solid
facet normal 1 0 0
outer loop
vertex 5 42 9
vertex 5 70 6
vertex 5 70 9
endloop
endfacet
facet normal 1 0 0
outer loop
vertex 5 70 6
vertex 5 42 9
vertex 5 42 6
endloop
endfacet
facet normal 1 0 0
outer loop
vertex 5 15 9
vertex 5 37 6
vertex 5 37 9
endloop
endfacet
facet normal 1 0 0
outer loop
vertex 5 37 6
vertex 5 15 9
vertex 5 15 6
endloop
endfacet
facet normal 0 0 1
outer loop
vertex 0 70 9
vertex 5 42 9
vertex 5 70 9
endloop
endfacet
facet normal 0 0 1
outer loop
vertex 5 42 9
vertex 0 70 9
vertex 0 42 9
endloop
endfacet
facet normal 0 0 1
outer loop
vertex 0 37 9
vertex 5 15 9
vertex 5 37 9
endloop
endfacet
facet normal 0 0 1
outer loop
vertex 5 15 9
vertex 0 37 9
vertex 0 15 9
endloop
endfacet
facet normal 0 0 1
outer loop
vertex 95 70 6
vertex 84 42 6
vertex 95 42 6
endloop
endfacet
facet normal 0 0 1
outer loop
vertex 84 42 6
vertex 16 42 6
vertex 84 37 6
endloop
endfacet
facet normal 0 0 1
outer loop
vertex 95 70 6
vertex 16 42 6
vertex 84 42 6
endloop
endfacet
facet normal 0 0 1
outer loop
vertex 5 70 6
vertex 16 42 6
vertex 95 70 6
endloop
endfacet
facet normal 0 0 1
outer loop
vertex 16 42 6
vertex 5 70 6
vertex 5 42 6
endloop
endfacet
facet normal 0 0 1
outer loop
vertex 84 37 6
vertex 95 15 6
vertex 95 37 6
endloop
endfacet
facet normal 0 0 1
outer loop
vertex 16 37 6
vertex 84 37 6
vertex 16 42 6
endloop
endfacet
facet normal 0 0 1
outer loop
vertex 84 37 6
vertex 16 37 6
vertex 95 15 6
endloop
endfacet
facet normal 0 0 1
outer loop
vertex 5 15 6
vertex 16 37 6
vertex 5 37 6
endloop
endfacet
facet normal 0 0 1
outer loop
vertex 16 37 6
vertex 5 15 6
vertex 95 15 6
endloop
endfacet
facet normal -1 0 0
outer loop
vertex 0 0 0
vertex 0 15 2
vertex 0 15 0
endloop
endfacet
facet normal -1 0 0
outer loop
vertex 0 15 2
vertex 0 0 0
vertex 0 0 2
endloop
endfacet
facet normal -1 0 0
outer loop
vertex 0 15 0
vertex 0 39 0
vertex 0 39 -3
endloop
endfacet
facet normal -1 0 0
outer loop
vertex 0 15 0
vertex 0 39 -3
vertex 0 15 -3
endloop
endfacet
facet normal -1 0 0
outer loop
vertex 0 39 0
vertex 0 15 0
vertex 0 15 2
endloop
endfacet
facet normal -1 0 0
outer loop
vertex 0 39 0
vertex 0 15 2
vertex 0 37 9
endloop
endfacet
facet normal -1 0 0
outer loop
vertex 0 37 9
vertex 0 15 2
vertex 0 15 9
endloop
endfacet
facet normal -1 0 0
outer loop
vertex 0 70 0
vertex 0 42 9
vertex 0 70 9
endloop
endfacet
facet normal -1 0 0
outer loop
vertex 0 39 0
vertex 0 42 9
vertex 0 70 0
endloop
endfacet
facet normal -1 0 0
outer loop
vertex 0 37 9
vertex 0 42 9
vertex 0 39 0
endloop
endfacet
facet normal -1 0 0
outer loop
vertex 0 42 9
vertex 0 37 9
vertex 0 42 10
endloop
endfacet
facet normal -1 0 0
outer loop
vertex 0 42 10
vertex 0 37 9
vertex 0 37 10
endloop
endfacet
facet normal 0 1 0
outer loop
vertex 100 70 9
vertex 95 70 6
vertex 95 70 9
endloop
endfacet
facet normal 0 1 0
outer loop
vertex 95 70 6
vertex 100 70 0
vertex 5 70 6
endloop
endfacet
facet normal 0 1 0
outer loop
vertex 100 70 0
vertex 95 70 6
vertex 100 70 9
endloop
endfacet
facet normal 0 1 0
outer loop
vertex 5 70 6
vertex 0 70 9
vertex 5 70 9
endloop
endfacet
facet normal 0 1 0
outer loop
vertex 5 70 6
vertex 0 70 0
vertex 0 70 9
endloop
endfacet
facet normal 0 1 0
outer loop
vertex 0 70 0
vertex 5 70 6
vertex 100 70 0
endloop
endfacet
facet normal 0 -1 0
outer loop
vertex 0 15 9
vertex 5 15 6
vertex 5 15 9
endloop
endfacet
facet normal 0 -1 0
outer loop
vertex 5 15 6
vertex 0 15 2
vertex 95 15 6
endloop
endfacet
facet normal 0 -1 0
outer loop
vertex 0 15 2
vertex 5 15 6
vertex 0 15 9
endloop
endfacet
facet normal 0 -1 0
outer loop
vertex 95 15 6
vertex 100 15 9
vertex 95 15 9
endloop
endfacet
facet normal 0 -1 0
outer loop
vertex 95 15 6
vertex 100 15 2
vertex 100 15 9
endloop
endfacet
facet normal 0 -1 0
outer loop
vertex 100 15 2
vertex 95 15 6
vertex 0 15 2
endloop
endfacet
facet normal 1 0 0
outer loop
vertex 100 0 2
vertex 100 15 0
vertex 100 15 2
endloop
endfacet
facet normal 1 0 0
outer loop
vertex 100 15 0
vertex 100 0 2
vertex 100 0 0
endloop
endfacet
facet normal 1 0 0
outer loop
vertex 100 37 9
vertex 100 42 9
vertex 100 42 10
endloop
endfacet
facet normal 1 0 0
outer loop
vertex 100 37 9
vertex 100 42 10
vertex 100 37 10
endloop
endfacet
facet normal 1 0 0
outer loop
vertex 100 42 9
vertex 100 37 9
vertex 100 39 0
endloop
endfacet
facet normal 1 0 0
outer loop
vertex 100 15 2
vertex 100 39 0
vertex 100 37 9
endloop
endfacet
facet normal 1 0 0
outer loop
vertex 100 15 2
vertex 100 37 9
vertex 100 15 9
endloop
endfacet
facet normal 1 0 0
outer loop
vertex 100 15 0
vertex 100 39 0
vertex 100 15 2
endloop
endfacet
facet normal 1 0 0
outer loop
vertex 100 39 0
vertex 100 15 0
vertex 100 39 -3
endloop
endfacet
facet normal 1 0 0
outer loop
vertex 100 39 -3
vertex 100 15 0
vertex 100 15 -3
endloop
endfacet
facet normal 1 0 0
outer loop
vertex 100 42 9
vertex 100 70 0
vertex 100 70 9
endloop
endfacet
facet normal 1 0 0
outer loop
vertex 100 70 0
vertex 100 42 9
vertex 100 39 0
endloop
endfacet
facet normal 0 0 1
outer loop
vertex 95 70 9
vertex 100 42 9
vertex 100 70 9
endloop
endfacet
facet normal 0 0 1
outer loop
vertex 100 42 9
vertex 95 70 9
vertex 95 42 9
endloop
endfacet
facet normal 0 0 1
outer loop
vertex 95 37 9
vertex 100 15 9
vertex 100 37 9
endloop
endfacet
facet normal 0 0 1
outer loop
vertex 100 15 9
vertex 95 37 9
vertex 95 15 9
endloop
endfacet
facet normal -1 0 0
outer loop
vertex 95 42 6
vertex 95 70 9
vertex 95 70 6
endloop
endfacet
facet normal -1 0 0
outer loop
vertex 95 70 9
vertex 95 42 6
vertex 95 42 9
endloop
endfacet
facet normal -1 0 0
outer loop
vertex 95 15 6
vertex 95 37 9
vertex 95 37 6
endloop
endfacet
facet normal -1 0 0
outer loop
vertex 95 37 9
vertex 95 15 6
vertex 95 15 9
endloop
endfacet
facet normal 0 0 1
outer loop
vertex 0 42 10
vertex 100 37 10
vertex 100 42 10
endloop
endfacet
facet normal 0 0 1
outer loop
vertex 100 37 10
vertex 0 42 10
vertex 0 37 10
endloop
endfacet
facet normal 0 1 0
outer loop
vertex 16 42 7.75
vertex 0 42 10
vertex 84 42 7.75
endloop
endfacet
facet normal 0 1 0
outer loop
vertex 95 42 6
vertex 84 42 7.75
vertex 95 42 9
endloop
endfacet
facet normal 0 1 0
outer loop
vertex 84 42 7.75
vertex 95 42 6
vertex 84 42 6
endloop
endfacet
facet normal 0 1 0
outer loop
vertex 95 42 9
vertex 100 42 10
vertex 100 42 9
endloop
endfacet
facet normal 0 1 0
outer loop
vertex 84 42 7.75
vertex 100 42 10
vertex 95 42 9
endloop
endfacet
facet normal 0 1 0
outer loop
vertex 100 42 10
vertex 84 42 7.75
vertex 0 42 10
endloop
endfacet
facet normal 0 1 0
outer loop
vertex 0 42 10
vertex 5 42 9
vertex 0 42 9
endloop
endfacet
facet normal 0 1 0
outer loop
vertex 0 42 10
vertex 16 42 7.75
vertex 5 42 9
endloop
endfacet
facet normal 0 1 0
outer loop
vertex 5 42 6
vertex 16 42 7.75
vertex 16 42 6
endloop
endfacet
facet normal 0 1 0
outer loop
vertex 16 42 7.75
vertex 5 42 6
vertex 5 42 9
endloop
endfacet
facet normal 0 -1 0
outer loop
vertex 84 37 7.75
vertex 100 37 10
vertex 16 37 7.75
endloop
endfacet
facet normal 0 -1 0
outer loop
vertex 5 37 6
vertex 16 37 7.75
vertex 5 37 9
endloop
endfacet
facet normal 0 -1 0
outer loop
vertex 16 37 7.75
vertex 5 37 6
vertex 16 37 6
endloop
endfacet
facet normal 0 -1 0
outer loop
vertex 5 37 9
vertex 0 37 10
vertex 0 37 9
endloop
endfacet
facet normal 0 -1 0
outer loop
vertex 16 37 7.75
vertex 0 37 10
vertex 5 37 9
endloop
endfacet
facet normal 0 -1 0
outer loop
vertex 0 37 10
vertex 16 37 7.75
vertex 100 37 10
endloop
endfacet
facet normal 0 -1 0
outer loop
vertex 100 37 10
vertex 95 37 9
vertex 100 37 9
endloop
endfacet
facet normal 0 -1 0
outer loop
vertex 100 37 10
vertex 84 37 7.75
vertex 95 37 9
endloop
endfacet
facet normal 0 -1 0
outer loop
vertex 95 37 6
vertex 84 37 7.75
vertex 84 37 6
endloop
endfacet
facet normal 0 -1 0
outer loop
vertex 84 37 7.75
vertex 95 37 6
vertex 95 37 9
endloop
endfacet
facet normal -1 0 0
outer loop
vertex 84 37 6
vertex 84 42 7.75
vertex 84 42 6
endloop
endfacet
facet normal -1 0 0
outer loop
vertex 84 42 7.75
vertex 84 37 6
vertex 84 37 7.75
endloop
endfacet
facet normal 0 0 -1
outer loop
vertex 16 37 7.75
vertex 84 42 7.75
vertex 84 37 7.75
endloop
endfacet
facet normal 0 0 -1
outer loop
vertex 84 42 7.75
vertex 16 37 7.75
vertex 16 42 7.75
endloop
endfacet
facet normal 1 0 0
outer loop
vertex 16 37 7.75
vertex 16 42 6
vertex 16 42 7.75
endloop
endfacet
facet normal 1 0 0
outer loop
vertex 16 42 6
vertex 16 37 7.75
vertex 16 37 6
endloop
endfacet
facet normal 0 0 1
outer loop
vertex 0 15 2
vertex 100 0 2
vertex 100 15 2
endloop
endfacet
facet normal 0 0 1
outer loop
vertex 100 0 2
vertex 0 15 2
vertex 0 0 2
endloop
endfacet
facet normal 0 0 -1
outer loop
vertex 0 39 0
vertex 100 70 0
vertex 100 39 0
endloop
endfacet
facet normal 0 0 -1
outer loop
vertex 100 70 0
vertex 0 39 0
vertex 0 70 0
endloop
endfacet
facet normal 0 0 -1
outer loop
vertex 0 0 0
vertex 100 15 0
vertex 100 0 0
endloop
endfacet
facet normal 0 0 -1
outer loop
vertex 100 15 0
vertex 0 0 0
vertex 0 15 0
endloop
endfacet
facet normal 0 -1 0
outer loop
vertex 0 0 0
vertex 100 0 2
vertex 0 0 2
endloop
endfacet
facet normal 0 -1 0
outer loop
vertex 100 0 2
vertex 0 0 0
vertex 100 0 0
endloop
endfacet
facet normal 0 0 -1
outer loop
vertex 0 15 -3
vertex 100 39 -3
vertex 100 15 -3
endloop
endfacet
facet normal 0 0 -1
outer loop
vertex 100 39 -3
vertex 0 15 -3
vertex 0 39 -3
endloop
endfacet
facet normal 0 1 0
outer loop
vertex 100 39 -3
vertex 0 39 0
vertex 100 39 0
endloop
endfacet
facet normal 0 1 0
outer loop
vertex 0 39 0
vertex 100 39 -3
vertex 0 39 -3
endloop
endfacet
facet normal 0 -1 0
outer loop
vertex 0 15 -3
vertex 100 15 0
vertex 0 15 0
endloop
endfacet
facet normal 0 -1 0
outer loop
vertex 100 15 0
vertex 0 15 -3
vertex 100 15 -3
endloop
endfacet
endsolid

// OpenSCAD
// === Parameters ===

// Base slab
base_x      = 100;   // full length (X)
base_y      = 70;    // full width  (Y)
base_z      = 2;     // slab thickness (Z)

// Front exposed strip (gap between front edge and rear block)
front_strip = 15;    // Y depth of exposed front strip

// Rear raised block
rear_y      = base_y - front_strip;  // depth of rear block
rear_z      = 4;     // height of rear block above base top

// Narrow side strips (run along left/right of raised area)
strip_w     = 5;     // width of each side strip (X)
strip_z     = 3;     // additional height above rear block

// Transverse feature with internal opening
trans_depth   = 5;   // Y dimension (thin bar)
trans_height  = 8;   // Z height above base top surface
trans_y_off   = 22;  // Y offset from start of rear area
slot_width    = 68;  // X extent of internal opening
slot_height   = 3.5; // Z extent of internal opening

// Stepped bottom — deeper section extends below the base
step_drop     = 3;   // how far below z=0 the deep part goes
step_y_start  = front_strip;   // begins at rear-block front edge
step_y_len    = 24;  // Y length of the deeper section

$fn = 50;

// === Modules ===

// 1. Thin rectangular base slab
module base_slab() {
    cube([base_x, base_y, base_z]);
}

// 2. Rear raised rectangular block (leaves front strip exposed)
module rear_block() {
    translate([0, front_strip, base_z])
        cube([base_x, rear_y, rear_z]);
}

// 3. Narrow raised strips along left and right sides of the rear block
module side_strips() {
    h = strip_z;
    z0 = base_z + rear_z;
    // Left strip
    translate([0, front_strip, z0])
        cube([strip_w, rear_y, h]);
    // Right strip
    translate([base_x - strip_w, front_strip, z0])
        cube([strip_w, rear_y, h]);
}

// 4. Thin transverse bar spanning full width with a real internal slot
module transverse_feature() {
    z0 = base_z;
    translate([0, front_strip + trans_y_off, z0])
        difference() {
            // Solid bar
            cube([base_x, trans_depth, trans_height]);
            // Internal rectangular opening (centred in X and Z)
            translate([(base_x - slot_width) / 2,
                       -0.1,
                       (trans_height - slot_height) / 2])
                cube([slot_width, trans_depth + 0.2, slot_height]);
        }
}

// 5. Stepped bottom — a section that hangs below the base plane
module stepped_bottom() {
    translate([0, step_y_start, -step_drop])
        cube([base_x, step_y_len, step_drop]);
}

// === Assembly ===
union() {
    base_slab();
    rear_block();
    side_strips();
    transverse_feature();
    stepped_bottom();
}
